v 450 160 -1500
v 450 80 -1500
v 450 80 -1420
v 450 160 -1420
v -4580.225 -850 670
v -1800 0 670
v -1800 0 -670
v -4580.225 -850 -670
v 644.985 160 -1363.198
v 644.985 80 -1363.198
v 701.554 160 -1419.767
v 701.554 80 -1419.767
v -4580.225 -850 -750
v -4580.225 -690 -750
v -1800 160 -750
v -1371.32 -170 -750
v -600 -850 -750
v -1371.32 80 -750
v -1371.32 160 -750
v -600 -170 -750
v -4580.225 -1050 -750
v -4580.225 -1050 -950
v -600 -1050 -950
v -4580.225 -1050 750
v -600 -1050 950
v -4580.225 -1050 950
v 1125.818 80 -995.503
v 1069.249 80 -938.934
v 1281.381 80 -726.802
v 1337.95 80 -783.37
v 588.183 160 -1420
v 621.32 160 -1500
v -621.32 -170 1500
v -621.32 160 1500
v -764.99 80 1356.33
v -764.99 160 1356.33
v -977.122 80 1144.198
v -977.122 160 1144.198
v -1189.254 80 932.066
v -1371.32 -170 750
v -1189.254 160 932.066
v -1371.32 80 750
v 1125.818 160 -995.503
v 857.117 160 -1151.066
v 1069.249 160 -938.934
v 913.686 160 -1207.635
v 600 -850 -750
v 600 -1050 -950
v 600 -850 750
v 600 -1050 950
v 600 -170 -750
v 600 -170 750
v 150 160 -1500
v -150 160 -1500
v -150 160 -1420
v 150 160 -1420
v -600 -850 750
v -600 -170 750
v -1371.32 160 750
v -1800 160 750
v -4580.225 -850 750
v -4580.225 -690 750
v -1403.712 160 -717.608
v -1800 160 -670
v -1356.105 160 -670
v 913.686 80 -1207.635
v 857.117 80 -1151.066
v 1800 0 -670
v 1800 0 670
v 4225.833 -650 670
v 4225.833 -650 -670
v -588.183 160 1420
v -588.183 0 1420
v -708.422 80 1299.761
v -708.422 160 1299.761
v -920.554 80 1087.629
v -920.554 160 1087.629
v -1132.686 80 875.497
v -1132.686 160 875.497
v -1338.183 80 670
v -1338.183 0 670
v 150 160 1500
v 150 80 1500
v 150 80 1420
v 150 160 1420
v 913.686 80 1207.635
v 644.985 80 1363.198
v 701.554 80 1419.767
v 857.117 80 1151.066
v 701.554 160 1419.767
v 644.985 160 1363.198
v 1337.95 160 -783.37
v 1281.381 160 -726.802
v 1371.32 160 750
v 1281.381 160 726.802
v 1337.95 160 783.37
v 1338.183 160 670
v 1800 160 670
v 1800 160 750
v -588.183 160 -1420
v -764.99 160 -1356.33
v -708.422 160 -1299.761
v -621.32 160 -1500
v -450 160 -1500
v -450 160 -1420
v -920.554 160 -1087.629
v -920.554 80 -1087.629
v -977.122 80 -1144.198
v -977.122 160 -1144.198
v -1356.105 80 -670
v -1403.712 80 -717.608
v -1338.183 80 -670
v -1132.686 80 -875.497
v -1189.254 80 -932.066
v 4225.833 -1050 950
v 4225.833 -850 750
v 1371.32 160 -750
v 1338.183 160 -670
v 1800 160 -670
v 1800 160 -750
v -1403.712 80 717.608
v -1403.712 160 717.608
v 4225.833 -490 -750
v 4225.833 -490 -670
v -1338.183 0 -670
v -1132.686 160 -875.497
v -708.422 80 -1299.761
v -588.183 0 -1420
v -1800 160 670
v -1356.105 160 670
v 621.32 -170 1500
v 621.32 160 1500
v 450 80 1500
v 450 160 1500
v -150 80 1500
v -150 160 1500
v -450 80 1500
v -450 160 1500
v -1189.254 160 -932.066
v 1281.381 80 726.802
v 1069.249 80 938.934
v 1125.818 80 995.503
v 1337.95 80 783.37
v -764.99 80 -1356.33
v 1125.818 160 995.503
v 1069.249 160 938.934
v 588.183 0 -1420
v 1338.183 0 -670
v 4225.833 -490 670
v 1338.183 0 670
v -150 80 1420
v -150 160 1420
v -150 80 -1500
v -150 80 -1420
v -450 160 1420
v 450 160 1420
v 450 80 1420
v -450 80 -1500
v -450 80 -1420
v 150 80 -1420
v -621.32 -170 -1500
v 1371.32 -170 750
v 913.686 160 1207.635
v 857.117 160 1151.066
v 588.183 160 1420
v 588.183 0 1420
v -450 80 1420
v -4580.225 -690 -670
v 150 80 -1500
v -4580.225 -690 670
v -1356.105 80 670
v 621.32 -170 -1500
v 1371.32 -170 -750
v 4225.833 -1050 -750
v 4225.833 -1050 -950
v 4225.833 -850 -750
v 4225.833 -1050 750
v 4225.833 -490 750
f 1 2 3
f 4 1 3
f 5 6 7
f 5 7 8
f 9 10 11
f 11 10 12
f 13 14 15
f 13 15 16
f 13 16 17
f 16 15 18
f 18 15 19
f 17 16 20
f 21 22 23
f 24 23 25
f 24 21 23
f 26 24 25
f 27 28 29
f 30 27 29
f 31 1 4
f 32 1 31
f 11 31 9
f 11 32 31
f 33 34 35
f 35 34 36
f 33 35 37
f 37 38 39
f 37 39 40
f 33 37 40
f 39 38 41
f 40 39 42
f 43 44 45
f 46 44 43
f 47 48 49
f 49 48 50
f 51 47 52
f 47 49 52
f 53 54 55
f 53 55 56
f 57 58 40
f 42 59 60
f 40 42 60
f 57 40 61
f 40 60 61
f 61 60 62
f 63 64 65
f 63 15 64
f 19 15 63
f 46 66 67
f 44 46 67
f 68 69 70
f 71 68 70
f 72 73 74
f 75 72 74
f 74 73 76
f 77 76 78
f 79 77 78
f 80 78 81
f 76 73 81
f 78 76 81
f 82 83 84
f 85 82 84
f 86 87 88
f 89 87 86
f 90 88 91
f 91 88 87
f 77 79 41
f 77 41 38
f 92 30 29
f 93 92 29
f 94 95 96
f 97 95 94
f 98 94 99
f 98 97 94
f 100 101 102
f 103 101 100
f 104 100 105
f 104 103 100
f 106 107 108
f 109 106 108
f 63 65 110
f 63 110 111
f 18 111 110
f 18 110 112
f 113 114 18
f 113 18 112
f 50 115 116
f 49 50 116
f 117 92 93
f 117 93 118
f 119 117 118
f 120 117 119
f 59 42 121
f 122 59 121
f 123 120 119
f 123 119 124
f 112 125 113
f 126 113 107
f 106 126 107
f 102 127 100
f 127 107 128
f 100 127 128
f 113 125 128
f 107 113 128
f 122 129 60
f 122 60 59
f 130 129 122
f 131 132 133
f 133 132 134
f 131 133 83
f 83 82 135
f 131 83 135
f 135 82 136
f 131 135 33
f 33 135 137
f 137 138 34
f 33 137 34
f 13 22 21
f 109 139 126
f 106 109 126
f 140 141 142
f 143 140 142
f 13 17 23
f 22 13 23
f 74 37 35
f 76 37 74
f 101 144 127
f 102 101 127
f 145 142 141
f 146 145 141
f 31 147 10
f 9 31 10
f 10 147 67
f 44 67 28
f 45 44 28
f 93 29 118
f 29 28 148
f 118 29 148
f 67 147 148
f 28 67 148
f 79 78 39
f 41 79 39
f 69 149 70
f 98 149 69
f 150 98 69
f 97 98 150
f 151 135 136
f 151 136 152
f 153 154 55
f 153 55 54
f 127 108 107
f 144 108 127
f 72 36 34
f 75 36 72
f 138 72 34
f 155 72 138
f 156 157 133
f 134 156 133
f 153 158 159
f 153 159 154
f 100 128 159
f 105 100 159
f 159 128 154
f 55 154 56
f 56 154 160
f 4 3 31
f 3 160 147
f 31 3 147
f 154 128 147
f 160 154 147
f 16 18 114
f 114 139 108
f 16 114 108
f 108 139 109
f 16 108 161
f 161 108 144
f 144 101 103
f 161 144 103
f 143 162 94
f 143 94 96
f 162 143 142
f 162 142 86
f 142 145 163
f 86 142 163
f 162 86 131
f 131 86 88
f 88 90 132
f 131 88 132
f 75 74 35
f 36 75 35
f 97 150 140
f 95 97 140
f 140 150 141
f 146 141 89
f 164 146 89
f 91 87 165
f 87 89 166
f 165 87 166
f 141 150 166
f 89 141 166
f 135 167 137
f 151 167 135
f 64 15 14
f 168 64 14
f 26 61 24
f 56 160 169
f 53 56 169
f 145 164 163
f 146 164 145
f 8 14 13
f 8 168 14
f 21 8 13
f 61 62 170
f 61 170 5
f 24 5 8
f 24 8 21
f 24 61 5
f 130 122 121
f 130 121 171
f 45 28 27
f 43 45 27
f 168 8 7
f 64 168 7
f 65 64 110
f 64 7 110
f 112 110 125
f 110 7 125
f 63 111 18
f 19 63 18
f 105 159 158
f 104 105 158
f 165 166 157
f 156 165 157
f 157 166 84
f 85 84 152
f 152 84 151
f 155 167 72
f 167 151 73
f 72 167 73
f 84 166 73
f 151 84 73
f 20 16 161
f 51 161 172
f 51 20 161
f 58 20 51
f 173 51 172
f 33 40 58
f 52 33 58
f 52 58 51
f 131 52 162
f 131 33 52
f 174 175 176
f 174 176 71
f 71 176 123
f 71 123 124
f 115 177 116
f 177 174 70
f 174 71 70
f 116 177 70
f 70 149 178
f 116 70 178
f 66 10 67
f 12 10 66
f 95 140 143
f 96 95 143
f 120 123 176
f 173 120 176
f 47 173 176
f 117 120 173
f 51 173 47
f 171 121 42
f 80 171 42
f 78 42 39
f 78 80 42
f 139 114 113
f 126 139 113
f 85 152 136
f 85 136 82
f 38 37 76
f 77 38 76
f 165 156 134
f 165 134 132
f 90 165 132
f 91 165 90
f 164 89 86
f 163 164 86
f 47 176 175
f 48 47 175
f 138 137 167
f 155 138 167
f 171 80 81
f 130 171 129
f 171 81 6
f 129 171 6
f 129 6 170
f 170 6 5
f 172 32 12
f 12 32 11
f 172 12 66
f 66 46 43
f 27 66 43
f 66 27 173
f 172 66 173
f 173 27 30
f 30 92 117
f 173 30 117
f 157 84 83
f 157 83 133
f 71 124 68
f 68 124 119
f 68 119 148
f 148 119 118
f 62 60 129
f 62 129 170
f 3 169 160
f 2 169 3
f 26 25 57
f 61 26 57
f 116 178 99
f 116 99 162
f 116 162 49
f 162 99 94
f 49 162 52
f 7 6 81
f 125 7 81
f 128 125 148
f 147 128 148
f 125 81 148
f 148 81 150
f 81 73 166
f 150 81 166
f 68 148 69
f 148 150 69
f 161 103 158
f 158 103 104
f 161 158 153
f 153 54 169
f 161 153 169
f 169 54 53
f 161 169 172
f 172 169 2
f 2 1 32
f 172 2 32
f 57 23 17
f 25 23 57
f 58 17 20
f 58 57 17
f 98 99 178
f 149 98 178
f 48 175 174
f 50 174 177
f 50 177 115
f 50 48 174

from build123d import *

# Parameters (mm, degrees)
EXTRUDE_1_DEPTH          = 80
EXTRUDE_1_2_DEPTH        = 80
SKETCH_2_W               = 300
SKETCH_2_H               = 80
EXTRUDE_2_DEPTH          = 80
EXTRUDE_3_DEPTH          = 170
EXTRUDE_4_DEPTH          = 1500
EXTRUDE_5_DEPTH          = 80
EXTRUDE_START            = -3980.224726
EXTRUDE_6_DEPTH          = 8806.057751
SKETCH_7_W               = 1200
SKETCH_7_H               = 200
CUT_EXTRUDE_1_DEPTH      = 751
CUT_EXTRUDE_1_DEPTH_BACK = 2251


with BuildPart() as part:
    # 草图1 → 凸台-拉伸1 (new body)
    with BuildSketch(Plane(origin=(0, 0, 0), x_dir=(1, 0, 0), z_dir=(0, 1, 0))):
        Polygon((1371.32034356, 750), (621.32034356, 1500), (-621.32034356, 1500), (-1371.32034356, 750), (-1800, 750), (-1800, 670), (-1338.18325857, 670), (-588.18325857, 1420), (588.18325857, 1420), (1338.18325857, 670), (1800, 670), (1800, 750), align=None)
    extrude(amount=EXTRUDE_1_DEPTH)



with BuildPart() as body_2:
    # 草图1 → Extrude 1 2 (new body)
    with BuildSketch(Plane(origin=(0, 0, 0), x_dir=(1, 0, 0), z_dir=(0, 1, 0))):
        Polygon((-1371.32034356, -750), (-621.32034356, -1500), (621.32034356, -1500), (1371.32034356, -750), (1800, -750), (1800, -670), (1338.18325857, -670), (588.18325857, -1420), (-588.18325857, -1420), (-1338.18325857, -670), (-1800, -670), (-1800, -750), align=None)
    extrude(amount=EXTRUDE_1_2_DEPTH)


with BuildPart() as part_1:
    add(part.part)

    add(body_2.part)  # 凸台-拉伸2 merges body 2
    # 草图2 → 凸台-拉伸2 (add)
    with BuildSketch(Plane(origin=(0, 80, 0), x_dir=(1, 0, 0), z_dir=(0, 1, 0))):
        with Locations((0, -1460)):
            Rectangle(SKETCH_2_W, SKETCH_2_H)
        Polygon((588.18325857, -1420), (450, -1420), (450, -1500), (621.32034356, -1500), (701.553749531, -1419.766594029), (644.985207036, -1363.198051534), align=None)
        Polygon((1125.817818243, -995.502525317), (1069.249275748, -938.933982822), (857.117241392, -1151.066017178), (913.685783887, -1207.634559673), align=None)
        Polygon((1338.18325857, -670), (1281.381310104, -726.801948466), (1337.949852599, -783.370490961), (1371.32034356, -750), (1800, -750), (1800, -670), align=None)
        Polygon((-1371.32034356, -750), (-1403.712468582, -717.607874978), (-1356.104593604, -670), (-1800, -670), (-1800, -750), align=None)
        Polygon((-1132.685863612, -875.497394958), (-1189.254406107, -932.065937453), (-977.122371751, -1144.197971809), (-920.553829256, -1087.629429314), align=None)
        Polygon((-450, -1420), (-588.18325857, -1420), (-708.4217949, -1299.76146367), (-764.990337395, -1356.330006165), (-621.32034356, -1500), (-450, -1500), align=None)
        with Locations((0, 1460)):
            Rectangle(SKETCH_2_W, SKETCH_2_H)
        Polygon((-588.18325857, 1420), (-450, 1420), (-450, 1500), (-621.32034356, 1500), (-764.990337395, 1356.330006165), (-708.4217949, 1299.76146367), align=None)
        Polygon((-1189.254406107, 932.065937453), (-1132.685863612, 875.497394958), (-920.553829256, 1087.629429314), (-977.122371751, 1144.197971809), align=None)
        Polygon((-1800, 670), (-1356.104593604, 670), (-1403.712468582, 717.607874978), (-1371.32034356, 750), (-1800, 750), align=None)
        Polygon((1371.32034356, 750), (1337.949852599, 783.370490961), (1281.381310104, 726.801948466), (1338.18325857, 670), (1800, 670), (1800, 750), align=None)
        Polygon((1069.249275748, 938.933982822), (1125.817818243, 995.502525317), (913.685783887, 1207.634559673), (857.117241392, 1151.066017178), align=None)
        Polygon((450, 1420), (588.18325857, 1420), (644.985207036, 1363.198051534), (701.553749531, 1419.766594029), (621.32034356, 1500), (450, 1500), align=None)
    extrude(amount=EXTRUDE_2_DEPTH)

    # 草图3 → 凸台-拉伸3 (add)
    with BuildSketch(Plane.XZ):
        Polygon((-1800, 750), (-1800, -750), (-1371.32034356, -750), (-621.32034356, -1500), (621.32034356, -1500), (1371.32034356, -750), (1800, -750), (1800, 750), (1371.32034356, 750), (621.32034356, 1500), (-621.32034356, 1500), (-1371.32034356, 750), align=None)
    extrude(amount=EXTRUDE_3_DEPTH)

    # 草图4 → 凸台-拉伸4 (add)
    with BuildSketch(Plane.XY.offset(750)):
        Polygon((-600, 0), (-1800, 0), (-4580.224725712, -850), (-4580.224725712, -1050), (-600, -1050), align=None)
        Polygon((600, 0), (1800, 0), (4225.83302492, -650), (4225.83302492, -1050), (600, -1050), align=None)
    extrude(amount=-EXTRUDE_4_DEPTH)

    # 草图5 → 凸台-拉伸5 (add)
    with BuildSketch(Plane(origin=(0, 0, -750), x_dir=(-1, 0, 0), z_dir=(0, 0, -1))):
        Polygon((-4225.83302492, -650), (-1800, 0), (-1800, 160), (-4225.83302492, -490), align=None)
        Polygon((4580.224725712, -850), (1800, 0), (1800, 160), (4580.224725712, -690), align=None)
    extrude_5 = extrude(amount=-EXTRUDE_5_DEPTH)

    # 镜向1: 凸台-拉伸5 across plane
    add(extrude_5.mirror(Plane.XY))

    # 草图6 → 凸台-拉伸6 (add)
    with BuildSketch(Plane(origin=(-600, 0, 0), x_dir=(0, 0, -1), z_dir=(1, 0, 0)).offset(EXTRUDE_START)):
        Polygon((750, -850), (950, -1050), (-950, -1050), (-750, -850), align=None)
    extrude(amount=EXTRUDE_6_DEPTH)

    # 草图7 → 切除-拉伸1 (cut, two sides)
    with BuildSketch(Plane.XY.offset(750)) as cut_extrude_1_sk:
        with Locations((0, -950)):
            Rectangle(SKETCH_7_W, SKETCH_7_H)
    extrude(amount=CUT_EXTRUDE_1_DEPTH, mode=Mode.SUBTRACT)
    extrude(cut_extrude_1_sk.sketch, amount=-CUT_EXTRUDE_1_DEPTH_BACK, mode=Mode.SUBTRACT)


solid = part_1.part
